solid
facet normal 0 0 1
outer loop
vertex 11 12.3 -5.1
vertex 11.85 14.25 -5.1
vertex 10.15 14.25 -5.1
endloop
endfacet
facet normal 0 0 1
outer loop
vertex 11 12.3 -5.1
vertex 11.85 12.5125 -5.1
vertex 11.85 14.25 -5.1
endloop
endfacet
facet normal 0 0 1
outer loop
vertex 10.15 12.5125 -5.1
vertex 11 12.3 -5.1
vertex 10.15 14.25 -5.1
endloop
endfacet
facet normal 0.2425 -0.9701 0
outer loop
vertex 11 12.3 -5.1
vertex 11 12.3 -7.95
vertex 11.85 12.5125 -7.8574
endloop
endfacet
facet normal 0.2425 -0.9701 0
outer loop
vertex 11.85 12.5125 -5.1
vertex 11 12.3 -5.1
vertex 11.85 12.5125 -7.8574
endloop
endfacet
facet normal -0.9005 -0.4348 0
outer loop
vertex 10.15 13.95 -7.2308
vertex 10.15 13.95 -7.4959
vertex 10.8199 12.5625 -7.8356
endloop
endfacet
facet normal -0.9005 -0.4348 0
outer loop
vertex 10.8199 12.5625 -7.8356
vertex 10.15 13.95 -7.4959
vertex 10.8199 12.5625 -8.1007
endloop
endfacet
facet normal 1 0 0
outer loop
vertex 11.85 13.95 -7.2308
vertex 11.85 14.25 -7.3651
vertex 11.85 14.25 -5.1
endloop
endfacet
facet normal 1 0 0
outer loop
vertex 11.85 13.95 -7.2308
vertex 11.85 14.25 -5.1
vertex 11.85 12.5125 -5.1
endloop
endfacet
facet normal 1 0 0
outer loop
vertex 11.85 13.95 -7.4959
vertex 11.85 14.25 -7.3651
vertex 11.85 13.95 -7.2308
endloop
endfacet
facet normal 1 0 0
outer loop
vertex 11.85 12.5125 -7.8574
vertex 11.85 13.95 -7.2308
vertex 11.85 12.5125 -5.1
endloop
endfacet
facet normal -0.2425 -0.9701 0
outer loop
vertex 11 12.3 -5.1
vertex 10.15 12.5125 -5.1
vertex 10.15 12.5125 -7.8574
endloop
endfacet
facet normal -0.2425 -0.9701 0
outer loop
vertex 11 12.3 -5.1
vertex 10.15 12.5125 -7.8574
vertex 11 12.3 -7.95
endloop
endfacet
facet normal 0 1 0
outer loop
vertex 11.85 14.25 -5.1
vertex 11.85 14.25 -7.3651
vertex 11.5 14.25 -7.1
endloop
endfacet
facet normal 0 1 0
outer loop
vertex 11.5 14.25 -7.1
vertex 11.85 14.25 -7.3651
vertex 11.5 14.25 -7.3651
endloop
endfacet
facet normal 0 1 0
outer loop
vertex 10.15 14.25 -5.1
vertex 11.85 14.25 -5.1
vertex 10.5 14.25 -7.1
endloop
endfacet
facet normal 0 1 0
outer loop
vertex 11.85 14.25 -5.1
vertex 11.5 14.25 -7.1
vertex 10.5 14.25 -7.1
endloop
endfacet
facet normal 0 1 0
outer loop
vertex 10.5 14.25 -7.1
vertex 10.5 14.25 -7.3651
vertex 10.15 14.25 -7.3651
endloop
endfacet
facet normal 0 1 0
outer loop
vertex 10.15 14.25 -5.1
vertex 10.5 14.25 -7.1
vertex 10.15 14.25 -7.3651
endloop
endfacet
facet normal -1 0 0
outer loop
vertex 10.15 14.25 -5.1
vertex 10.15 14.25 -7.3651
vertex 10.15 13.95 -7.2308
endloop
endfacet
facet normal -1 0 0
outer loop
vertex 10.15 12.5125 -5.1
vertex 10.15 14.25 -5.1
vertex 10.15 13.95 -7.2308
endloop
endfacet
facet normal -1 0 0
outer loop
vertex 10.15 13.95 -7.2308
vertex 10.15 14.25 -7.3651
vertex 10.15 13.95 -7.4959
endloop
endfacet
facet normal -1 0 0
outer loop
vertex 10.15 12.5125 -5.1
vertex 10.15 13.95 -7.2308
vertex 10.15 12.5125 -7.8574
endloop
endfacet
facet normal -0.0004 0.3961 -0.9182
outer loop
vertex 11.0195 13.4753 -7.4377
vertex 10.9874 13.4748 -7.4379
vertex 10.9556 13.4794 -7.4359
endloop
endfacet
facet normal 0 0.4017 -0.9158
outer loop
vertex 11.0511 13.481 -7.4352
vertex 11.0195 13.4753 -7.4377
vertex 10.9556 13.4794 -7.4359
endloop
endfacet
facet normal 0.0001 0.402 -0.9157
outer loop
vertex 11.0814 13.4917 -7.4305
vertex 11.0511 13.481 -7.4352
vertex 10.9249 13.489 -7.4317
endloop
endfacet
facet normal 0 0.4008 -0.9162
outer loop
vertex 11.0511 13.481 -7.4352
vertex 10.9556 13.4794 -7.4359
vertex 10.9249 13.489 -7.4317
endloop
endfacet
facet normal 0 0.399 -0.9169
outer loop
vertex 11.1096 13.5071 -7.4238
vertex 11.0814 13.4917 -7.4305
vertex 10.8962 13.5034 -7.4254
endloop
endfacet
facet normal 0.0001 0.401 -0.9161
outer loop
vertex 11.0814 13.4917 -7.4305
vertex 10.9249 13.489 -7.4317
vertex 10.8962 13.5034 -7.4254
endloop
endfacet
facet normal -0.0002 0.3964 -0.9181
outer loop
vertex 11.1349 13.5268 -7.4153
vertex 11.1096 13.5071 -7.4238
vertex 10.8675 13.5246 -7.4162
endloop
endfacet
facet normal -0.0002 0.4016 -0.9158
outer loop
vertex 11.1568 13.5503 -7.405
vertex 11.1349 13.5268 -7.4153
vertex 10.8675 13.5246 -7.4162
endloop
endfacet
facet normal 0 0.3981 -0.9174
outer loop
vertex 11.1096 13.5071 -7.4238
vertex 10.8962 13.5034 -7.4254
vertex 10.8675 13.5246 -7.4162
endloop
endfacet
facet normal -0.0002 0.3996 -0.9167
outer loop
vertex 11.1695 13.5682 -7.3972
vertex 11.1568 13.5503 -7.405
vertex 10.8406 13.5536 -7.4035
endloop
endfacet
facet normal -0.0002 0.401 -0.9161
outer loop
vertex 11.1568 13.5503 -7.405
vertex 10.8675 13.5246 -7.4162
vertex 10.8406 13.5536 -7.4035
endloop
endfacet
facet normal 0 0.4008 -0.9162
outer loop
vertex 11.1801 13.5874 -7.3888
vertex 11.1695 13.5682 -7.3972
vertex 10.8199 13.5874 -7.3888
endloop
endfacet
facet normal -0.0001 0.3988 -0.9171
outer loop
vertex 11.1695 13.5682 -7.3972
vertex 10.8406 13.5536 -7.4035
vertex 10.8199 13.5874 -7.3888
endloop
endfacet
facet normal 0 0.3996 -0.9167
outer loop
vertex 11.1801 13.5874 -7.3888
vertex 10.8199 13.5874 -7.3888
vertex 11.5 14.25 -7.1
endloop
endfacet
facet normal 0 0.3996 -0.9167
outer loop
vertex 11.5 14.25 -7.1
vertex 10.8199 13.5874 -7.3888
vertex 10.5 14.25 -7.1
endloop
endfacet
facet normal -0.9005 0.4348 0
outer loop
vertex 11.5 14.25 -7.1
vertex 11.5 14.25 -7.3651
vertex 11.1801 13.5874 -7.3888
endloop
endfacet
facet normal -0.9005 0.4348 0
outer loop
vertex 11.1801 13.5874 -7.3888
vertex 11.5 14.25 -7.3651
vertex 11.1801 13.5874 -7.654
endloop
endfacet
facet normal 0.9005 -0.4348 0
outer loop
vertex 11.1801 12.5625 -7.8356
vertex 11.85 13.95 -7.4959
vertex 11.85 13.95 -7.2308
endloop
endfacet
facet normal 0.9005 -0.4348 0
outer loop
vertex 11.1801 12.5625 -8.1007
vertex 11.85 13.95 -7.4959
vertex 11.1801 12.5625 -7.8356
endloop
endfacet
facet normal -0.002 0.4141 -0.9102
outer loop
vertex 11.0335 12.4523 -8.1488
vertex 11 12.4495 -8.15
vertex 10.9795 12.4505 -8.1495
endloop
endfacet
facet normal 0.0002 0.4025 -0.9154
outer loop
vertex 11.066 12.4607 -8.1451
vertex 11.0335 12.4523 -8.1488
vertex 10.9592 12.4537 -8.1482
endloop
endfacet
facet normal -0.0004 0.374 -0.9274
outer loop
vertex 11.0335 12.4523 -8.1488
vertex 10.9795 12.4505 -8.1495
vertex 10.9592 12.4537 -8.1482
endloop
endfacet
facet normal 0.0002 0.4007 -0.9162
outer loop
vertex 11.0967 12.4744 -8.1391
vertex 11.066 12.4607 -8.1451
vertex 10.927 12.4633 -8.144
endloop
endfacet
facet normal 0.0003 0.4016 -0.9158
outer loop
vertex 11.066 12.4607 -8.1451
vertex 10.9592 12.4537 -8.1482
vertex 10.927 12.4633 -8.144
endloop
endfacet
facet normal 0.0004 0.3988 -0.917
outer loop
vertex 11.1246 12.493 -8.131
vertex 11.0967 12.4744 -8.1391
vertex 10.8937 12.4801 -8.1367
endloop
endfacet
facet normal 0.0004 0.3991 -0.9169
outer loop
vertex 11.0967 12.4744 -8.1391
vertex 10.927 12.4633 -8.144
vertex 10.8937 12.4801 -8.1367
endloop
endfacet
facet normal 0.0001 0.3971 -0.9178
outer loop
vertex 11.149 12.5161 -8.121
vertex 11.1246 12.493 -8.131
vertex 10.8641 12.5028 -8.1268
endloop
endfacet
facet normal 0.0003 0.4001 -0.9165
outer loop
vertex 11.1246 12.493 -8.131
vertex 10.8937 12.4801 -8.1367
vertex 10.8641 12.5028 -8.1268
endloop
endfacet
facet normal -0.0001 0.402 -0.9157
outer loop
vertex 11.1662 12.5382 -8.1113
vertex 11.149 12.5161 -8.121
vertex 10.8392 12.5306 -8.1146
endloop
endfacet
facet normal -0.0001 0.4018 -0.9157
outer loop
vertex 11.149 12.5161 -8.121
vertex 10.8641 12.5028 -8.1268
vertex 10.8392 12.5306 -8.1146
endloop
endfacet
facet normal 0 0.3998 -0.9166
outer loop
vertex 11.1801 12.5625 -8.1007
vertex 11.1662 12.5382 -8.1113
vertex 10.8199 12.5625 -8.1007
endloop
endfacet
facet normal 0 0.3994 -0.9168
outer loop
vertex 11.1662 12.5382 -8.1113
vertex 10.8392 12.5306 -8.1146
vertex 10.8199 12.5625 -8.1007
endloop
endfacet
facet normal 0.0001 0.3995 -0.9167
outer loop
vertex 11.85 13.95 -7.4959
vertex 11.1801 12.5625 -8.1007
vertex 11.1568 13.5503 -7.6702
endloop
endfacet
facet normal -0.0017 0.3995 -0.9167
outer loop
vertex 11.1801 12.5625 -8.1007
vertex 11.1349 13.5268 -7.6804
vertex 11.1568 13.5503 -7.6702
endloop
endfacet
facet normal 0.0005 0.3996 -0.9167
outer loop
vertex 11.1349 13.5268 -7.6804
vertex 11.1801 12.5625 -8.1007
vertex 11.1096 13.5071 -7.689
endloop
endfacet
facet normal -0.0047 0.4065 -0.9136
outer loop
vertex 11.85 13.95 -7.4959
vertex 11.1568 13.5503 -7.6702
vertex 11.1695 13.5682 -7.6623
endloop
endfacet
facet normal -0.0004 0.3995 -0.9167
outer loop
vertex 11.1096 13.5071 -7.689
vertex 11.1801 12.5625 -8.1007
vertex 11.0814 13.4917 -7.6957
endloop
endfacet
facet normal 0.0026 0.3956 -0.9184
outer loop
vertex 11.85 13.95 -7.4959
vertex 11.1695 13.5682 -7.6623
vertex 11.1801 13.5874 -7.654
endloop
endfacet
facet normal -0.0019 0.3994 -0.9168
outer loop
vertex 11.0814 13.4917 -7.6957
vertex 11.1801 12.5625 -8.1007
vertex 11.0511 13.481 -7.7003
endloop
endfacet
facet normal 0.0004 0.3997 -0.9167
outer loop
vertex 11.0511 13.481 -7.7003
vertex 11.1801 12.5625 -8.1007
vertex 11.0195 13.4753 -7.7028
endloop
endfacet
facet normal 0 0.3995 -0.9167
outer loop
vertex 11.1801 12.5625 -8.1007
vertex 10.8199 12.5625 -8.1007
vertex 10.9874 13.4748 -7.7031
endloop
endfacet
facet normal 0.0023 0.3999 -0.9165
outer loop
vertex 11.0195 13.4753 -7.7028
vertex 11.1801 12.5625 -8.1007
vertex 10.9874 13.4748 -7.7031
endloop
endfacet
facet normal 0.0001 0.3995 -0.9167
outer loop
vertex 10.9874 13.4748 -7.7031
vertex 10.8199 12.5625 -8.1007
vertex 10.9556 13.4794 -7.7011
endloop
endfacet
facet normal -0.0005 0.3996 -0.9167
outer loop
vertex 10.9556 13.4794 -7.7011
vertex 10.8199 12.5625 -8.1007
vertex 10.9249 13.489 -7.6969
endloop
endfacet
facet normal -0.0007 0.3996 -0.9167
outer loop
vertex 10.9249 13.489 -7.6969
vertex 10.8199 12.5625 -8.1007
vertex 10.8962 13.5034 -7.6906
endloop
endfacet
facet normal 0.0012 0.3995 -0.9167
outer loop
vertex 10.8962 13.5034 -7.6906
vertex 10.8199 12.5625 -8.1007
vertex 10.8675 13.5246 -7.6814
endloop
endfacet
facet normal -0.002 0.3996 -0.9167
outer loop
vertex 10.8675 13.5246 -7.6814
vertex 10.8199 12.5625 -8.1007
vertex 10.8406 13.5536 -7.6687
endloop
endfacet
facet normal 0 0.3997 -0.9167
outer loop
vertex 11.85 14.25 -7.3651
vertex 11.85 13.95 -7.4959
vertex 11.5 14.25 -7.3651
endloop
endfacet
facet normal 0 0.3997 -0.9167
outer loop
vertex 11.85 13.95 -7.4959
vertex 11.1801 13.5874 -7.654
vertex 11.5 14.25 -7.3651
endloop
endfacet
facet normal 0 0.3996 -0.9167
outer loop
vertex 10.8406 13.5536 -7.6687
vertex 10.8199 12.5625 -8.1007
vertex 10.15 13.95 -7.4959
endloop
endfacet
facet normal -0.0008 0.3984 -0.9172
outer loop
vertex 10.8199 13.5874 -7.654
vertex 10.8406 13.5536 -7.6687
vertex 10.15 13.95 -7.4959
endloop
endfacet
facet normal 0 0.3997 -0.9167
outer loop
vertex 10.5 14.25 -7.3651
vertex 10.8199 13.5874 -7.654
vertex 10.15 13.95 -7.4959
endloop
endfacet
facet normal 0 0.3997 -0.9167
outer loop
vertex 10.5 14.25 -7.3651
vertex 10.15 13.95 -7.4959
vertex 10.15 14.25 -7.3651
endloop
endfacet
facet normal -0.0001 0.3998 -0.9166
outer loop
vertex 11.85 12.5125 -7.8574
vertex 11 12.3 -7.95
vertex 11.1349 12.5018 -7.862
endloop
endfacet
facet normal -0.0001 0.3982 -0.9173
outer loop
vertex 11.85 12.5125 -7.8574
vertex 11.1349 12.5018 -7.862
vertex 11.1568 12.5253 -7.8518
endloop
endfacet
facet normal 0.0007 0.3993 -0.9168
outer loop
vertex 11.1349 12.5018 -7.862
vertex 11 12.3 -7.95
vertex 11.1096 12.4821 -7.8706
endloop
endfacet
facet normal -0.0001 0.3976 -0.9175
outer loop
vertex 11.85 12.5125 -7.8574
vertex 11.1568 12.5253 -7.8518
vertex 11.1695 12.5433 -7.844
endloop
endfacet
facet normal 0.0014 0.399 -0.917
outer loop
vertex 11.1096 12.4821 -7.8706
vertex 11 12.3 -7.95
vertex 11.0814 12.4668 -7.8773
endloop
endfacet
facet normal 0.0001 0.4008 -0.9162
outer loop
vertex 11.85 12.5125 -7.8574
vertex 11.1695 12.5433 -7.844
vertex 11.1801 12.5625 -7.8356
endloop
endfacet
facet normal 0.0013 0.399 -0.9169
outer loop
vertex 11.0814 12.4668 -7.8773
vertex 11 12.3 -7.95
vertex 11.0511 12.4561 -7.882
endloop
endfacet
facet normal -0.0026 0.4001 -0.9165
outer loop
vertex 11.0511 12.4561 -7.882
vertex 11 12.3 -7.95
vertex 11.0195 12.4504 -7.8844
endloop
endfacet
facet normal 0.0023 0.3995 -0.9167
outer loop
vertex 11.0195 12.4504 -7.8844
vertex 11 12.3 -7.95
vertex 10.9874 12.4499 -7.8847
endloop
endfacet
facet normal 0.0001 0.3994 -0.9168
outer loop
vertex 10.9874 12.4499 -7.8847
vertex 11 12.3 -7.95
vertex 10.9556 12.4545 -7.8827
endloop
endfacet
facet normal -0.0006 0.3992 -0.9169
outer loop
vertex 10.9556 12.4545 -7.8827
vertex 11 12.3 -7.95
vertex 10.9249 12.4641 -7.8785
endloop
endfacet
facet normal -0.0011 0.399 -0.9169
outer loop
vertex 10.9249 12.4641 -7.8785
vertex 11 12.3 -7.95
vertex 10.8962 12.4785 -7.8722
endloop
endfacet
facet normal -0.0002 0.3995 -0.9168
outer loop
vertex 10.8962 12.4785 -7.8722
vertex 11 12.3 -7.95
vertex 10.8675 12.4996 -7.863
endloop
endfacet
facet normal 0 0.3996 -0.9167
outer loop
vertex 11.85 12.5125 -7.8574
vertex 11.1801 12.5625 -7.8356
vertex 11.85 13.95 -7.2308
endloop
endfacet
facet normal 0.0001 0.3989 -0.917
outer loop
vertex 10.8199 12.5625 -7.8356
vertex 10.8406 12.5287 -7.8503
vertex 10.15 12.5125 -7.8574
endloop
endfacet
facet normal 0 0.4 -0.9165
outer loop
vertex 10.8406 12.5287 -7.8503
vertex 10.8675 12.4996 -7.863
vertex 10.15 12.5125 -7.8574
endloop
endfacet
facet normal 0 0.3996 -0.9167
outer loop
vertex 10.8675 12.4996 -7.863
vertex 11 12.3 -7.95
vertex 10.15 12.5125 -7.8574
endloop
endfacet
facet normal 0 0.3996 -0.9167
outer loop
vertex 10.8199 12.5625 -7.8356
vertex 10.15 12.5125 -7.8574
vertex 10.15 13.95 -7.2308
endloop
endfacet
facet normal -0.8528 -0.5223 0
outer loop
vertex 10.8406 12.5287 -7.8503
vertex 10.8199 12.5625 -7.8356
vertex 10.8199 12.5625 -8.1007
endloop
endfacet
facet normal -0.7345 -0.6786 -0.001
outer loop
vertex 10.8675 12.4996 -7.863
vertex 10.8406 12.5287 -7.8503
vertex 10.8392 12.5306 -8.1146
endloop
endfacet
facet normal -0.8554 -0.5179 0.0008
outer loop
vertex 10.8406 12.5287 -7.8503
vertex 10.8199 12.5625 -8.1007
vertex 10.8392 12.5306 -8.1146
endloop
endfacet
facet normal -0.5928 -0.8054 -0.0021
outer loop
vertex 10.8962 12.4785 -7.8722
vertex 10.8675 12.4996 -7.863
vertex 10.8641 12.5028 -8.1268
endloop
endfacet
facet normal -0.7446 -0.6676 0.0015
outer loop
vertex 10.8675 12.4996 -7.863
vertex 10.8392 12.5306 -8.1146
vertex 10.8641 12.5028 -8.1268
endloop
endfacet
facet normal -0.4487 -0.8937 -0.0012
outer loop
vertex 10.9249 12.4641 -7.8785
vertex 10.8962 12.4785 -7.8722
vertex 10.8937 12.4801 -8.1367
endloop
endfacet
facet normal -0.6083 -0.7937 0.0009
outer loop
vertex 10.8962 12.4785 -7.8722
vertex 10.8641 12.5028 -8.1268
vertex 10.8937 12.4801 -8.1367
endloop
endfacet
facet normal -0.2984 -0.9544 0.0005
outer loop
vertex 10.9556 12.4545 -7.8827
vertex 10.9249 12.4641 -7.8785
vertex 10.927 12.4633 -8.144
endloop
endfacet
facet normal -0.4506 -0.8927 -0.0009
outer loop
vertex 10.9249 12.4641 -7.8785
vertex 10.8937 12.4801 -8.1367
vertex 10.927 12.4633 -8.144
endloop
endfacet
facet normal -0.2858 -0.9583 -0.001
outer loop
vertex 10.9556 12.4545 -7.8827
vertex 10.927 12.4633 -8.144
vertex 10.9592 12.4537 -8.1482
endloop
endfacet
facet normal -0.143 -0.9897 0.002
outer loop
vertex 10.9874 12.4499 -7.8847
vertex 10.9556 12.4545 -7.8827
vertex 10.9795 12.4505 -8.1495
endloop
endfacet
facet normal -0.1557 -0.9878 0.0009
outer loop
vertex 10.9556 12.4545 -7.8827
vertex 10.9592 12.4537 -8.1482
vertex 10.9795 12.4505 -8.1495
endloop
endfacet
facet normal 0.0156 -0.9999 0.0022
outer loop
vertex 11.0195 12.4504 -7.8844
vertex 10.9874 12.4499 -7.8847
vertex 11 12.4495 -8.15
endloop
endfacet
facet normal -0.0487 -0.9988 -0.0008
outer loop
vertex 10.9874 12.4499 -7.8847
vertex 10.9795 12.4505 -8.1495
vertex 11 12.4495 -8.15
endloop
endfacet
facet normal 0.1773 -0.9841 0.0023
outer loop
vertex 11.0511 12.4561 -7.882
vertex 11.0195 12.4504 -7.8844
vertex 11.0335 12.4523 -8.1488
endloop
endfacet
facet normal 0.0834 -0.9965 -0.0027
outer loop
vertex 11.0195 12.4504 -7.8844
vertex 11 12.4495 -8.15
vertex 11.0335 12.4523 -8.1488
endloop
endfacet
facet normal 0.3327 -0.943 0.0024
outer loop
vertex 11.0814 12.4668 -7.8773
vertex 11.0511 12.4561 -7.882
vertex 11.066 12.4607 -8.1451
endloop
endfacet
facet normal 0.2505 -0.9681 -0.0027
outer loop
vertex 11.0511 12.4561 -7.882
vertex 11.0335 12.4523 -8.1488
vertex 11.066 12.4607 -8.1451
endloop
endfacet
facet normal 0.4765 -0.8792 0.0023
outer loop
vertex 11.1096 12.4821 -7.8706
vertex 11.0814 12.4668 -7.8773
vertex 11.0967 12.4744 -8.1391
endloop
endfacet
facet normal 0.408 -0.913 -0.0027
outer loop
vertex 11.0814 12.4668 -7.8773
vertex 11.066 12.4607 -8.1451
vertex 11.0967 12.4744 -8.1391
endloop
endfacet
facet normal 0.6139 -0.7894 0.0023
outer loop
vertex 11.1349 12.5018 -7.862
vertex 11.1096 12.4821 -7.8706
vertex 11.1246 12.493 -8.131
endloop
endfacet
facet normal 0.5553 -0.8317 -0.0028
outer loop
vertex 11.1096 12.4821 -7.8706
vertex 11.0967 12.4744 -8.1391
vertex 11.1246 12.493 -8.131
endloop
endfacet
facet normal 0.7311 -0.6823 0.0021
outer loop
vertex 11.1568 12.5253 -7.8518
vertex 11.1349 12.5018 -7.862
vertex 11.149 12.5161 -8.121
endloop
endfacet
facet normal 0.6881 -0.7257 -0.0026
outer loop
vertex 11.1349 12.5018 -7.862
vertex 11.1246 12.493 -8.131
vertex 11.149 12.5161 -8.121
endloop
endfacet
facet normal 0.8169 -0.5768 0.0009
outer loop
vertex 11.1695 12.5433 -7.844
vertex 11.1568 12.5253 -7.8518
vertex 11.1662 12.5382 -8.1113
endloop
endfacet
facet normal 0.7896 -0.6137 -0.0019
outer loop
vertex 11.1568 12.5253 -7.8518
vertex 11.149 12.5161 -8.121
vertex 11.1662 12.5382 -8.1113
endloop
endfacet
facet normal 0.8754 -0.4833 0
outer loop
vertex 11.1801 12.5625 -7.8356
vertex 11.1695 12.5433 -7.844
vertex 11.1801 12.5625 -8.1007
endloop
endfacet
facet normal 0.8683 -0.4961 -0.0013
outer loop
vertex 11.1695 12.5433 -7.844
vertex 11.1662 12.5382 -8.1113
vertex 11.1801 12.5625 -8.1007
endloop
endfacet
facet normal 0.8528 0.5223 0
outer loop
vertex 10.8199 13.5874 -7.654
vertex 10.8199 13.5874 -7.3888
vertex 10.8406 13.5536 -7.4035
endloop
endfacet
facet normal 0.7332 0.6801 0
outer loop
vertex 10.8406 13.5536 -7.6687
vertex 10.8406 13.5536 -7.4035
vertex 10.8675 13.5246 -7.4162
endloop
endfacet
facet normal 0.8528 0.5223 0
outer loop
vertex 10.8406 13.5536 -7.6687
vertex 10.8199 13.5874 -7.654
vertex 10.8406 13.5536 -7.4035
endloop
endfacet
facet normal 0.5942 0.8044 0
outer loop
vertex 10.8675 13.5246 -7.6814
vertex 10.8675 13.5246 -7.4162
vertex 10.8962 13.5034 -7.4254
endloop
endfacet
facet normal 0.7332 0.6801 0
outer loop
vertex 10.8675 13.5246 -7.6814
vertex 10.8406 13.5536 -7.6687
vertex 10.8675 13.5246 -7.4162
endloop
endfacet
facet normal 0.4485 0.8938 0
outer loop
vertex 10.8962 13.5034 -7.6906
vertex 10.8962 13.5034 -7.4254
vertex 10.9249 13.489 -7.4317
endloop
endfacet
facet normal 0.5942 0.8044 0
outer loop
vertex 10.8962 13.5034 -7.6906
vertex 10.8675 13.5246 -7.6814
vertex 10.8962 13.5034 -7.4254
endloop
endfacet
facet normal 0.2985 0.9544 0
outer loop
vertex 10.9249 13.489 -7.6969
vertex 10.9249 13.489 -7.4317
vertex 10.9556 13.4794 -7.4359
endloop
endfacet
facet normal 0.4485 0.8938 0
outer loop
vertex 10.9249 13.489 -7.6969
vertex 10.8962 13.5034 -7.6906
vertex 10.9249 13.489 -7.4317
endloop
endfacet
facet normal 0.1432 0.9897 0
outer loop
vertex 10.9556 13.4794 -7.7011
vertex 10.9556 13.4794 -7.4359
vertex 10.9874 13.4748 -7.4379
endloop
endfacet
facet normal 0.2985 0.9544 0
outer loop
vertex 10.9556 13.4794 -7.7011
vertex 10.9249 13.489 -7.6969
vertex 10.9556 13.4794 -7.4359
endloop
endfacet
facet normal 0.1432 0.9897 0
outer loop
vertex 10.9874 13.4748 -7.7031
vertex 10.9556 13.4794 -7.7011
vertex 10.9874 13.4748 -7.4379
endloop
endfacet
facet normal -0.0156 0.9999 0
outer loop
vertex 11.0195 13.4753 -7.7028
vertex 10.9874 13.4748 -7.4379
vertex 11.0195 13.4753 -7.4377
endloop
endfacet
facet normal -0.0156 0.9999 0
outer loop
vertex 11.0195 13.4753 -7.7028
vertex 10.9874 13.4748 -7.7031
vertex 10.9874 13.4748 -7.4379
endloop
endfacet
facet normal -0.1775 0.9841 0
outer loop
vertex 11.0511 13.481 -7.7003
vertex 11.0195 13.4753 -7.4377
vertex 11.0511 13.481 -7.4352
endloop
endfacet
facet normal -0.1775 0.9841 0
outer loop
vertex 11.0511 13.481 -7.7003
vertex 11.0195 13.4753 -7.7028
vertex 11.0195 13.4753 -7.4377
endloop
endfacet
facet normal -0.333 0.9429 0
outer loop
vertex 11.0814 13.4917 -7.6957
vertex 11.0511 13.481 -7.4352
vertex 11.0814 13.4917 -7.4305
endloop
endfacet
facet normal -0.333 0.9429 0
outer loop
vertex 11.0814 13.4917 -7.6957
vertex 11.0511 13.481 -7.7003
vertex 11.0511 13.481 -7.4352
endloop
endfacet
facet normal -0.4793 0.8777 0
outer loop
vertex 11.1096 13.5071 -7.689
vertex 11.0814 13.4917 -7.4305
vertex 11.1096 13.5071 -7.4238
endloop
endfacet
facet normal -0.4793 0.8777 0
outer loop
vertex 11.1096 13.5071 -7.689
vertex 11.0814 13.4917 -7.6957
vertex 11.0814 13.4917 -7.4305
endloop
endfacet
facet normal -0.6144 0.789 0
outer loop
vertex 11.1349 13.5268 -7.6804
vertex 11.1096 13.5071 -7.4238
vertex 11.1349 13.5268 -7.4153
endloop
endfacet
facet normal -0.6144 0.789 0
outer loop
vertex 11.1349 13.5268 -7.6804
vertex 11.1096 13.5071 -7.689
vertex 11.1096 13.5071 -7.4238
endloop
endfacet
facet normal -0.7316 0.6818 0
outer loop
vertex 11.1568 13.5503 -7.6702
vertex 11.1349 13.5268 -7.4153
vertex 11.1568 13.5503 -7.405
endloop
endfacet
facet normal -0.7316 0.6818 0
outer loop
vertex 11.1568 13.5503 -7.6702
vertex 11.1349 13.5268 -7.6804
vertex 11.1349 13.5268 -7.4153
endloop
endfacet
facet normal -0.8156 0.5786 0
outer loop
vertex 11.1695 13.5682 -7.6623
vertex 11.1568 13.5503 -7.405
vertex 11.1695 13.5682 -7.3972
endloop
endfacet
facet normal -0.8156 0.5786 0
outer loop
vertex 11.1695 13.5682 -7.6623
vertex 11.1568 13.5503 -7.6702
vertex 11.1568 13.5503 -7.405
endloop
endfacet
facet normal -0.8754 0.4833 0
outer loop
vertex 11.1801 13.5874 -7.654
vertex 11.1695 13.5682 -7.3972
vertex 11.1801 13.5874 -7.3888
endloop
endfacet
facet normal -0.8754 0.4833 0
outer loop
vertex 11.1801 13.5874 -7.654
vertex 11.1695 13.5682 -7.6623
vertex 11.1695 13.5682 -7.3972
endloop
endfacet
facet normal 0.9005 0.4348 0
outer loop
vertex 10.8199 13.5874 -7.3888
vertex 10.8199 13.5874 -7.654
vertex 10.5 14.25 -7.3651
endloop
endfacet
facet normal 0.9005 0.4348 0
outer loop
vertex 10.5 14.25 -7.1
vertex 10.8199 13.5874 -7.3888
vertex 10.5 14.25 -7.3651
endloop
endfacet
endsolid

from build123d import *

# Parameters (mm, degrees)
PAD103_DEPTH    = 3
POCKET009_DEPTH = 5
PAD104_DEPTH    = 2
POCKET010_DEPTH = 5


with BuildPart() as part:
    # Sketch130 (on Face1 of Binder) → Pad103 (new body)
    with BuildSketch(Plane(origin=(0, 0, -5.1), x_dir=(1, 0, 0), z_dir=(0, 0, -1))):
        Polygon((11.85, -14.25), (10.15, -14.25), (10.15, -12.5125), (11, -12.3), (11.85, -12.5125), align=None)
    extrude(amount=PAD103_DEPTH)

    # Sketch131 (on Face2 of Pad103) → Pocket009 (cut)
    with BuildSketch(Plane(origin=(10.15, 0, 0), x_dir=(0, -1, 0), z_dir=(-1, 0, 0))):
        Polygon((-14.25, -7.1), (-14.25, -8.1), (-12.3, -8.1), (-12.3, -7.95), align=None)
    extrude(amount=-POCKET009_DEPTH, mode=Mode.SUBTRACT)

    # Sketch132 → Pad104 (join)
    with BuildSketch(Plane.XY.offset(-9)):
        with BuildLine():
            Line((11.85, 14.25), (11.5, 14.25))
            Line((11.5, 14.25), (11.180107, 13.587429))
            ThreePointArc((10.819893, 13.587429), (11, 13.474386), (11.180107, 13.587429))
            Line((10.819893, 13.587429), (10.5, 14.25))
            Line((10.5, 14.25), (10.15, 14.25))
            Line((10.15, 14.25), (10.15, 13.95))
            Line((10.15, 13.95), (10.819893, 12.5625))
            ThreePointArc((10.819893, 12.5625), (11, 12.449457), (11.180107, 12.5625))
            Line((11.85, 13.95), (11.180107, 12.5625))
            Line((11.85, 14.25), (11.85, 13.95))
        make_face()
    extrude(amount=PAD104_DEPTH)

    # Sketch133 (on Face14 of Pad104) → Pocket010 (cut)
    with BuildSketch(Plane(origin=(10.15, 0, 0), x_dir=(0, -1, 0), z_dir=(-1, 0, 0))):
        Polygon((-12.449457, -9), (-12.449457, -8.15), (-14.25, -7.365148), (-14.25, -9), align=None)
    extrude(amount=-POCKET010_DEPTH, mode=Mode.SUBTRACT)


solid = part.part
